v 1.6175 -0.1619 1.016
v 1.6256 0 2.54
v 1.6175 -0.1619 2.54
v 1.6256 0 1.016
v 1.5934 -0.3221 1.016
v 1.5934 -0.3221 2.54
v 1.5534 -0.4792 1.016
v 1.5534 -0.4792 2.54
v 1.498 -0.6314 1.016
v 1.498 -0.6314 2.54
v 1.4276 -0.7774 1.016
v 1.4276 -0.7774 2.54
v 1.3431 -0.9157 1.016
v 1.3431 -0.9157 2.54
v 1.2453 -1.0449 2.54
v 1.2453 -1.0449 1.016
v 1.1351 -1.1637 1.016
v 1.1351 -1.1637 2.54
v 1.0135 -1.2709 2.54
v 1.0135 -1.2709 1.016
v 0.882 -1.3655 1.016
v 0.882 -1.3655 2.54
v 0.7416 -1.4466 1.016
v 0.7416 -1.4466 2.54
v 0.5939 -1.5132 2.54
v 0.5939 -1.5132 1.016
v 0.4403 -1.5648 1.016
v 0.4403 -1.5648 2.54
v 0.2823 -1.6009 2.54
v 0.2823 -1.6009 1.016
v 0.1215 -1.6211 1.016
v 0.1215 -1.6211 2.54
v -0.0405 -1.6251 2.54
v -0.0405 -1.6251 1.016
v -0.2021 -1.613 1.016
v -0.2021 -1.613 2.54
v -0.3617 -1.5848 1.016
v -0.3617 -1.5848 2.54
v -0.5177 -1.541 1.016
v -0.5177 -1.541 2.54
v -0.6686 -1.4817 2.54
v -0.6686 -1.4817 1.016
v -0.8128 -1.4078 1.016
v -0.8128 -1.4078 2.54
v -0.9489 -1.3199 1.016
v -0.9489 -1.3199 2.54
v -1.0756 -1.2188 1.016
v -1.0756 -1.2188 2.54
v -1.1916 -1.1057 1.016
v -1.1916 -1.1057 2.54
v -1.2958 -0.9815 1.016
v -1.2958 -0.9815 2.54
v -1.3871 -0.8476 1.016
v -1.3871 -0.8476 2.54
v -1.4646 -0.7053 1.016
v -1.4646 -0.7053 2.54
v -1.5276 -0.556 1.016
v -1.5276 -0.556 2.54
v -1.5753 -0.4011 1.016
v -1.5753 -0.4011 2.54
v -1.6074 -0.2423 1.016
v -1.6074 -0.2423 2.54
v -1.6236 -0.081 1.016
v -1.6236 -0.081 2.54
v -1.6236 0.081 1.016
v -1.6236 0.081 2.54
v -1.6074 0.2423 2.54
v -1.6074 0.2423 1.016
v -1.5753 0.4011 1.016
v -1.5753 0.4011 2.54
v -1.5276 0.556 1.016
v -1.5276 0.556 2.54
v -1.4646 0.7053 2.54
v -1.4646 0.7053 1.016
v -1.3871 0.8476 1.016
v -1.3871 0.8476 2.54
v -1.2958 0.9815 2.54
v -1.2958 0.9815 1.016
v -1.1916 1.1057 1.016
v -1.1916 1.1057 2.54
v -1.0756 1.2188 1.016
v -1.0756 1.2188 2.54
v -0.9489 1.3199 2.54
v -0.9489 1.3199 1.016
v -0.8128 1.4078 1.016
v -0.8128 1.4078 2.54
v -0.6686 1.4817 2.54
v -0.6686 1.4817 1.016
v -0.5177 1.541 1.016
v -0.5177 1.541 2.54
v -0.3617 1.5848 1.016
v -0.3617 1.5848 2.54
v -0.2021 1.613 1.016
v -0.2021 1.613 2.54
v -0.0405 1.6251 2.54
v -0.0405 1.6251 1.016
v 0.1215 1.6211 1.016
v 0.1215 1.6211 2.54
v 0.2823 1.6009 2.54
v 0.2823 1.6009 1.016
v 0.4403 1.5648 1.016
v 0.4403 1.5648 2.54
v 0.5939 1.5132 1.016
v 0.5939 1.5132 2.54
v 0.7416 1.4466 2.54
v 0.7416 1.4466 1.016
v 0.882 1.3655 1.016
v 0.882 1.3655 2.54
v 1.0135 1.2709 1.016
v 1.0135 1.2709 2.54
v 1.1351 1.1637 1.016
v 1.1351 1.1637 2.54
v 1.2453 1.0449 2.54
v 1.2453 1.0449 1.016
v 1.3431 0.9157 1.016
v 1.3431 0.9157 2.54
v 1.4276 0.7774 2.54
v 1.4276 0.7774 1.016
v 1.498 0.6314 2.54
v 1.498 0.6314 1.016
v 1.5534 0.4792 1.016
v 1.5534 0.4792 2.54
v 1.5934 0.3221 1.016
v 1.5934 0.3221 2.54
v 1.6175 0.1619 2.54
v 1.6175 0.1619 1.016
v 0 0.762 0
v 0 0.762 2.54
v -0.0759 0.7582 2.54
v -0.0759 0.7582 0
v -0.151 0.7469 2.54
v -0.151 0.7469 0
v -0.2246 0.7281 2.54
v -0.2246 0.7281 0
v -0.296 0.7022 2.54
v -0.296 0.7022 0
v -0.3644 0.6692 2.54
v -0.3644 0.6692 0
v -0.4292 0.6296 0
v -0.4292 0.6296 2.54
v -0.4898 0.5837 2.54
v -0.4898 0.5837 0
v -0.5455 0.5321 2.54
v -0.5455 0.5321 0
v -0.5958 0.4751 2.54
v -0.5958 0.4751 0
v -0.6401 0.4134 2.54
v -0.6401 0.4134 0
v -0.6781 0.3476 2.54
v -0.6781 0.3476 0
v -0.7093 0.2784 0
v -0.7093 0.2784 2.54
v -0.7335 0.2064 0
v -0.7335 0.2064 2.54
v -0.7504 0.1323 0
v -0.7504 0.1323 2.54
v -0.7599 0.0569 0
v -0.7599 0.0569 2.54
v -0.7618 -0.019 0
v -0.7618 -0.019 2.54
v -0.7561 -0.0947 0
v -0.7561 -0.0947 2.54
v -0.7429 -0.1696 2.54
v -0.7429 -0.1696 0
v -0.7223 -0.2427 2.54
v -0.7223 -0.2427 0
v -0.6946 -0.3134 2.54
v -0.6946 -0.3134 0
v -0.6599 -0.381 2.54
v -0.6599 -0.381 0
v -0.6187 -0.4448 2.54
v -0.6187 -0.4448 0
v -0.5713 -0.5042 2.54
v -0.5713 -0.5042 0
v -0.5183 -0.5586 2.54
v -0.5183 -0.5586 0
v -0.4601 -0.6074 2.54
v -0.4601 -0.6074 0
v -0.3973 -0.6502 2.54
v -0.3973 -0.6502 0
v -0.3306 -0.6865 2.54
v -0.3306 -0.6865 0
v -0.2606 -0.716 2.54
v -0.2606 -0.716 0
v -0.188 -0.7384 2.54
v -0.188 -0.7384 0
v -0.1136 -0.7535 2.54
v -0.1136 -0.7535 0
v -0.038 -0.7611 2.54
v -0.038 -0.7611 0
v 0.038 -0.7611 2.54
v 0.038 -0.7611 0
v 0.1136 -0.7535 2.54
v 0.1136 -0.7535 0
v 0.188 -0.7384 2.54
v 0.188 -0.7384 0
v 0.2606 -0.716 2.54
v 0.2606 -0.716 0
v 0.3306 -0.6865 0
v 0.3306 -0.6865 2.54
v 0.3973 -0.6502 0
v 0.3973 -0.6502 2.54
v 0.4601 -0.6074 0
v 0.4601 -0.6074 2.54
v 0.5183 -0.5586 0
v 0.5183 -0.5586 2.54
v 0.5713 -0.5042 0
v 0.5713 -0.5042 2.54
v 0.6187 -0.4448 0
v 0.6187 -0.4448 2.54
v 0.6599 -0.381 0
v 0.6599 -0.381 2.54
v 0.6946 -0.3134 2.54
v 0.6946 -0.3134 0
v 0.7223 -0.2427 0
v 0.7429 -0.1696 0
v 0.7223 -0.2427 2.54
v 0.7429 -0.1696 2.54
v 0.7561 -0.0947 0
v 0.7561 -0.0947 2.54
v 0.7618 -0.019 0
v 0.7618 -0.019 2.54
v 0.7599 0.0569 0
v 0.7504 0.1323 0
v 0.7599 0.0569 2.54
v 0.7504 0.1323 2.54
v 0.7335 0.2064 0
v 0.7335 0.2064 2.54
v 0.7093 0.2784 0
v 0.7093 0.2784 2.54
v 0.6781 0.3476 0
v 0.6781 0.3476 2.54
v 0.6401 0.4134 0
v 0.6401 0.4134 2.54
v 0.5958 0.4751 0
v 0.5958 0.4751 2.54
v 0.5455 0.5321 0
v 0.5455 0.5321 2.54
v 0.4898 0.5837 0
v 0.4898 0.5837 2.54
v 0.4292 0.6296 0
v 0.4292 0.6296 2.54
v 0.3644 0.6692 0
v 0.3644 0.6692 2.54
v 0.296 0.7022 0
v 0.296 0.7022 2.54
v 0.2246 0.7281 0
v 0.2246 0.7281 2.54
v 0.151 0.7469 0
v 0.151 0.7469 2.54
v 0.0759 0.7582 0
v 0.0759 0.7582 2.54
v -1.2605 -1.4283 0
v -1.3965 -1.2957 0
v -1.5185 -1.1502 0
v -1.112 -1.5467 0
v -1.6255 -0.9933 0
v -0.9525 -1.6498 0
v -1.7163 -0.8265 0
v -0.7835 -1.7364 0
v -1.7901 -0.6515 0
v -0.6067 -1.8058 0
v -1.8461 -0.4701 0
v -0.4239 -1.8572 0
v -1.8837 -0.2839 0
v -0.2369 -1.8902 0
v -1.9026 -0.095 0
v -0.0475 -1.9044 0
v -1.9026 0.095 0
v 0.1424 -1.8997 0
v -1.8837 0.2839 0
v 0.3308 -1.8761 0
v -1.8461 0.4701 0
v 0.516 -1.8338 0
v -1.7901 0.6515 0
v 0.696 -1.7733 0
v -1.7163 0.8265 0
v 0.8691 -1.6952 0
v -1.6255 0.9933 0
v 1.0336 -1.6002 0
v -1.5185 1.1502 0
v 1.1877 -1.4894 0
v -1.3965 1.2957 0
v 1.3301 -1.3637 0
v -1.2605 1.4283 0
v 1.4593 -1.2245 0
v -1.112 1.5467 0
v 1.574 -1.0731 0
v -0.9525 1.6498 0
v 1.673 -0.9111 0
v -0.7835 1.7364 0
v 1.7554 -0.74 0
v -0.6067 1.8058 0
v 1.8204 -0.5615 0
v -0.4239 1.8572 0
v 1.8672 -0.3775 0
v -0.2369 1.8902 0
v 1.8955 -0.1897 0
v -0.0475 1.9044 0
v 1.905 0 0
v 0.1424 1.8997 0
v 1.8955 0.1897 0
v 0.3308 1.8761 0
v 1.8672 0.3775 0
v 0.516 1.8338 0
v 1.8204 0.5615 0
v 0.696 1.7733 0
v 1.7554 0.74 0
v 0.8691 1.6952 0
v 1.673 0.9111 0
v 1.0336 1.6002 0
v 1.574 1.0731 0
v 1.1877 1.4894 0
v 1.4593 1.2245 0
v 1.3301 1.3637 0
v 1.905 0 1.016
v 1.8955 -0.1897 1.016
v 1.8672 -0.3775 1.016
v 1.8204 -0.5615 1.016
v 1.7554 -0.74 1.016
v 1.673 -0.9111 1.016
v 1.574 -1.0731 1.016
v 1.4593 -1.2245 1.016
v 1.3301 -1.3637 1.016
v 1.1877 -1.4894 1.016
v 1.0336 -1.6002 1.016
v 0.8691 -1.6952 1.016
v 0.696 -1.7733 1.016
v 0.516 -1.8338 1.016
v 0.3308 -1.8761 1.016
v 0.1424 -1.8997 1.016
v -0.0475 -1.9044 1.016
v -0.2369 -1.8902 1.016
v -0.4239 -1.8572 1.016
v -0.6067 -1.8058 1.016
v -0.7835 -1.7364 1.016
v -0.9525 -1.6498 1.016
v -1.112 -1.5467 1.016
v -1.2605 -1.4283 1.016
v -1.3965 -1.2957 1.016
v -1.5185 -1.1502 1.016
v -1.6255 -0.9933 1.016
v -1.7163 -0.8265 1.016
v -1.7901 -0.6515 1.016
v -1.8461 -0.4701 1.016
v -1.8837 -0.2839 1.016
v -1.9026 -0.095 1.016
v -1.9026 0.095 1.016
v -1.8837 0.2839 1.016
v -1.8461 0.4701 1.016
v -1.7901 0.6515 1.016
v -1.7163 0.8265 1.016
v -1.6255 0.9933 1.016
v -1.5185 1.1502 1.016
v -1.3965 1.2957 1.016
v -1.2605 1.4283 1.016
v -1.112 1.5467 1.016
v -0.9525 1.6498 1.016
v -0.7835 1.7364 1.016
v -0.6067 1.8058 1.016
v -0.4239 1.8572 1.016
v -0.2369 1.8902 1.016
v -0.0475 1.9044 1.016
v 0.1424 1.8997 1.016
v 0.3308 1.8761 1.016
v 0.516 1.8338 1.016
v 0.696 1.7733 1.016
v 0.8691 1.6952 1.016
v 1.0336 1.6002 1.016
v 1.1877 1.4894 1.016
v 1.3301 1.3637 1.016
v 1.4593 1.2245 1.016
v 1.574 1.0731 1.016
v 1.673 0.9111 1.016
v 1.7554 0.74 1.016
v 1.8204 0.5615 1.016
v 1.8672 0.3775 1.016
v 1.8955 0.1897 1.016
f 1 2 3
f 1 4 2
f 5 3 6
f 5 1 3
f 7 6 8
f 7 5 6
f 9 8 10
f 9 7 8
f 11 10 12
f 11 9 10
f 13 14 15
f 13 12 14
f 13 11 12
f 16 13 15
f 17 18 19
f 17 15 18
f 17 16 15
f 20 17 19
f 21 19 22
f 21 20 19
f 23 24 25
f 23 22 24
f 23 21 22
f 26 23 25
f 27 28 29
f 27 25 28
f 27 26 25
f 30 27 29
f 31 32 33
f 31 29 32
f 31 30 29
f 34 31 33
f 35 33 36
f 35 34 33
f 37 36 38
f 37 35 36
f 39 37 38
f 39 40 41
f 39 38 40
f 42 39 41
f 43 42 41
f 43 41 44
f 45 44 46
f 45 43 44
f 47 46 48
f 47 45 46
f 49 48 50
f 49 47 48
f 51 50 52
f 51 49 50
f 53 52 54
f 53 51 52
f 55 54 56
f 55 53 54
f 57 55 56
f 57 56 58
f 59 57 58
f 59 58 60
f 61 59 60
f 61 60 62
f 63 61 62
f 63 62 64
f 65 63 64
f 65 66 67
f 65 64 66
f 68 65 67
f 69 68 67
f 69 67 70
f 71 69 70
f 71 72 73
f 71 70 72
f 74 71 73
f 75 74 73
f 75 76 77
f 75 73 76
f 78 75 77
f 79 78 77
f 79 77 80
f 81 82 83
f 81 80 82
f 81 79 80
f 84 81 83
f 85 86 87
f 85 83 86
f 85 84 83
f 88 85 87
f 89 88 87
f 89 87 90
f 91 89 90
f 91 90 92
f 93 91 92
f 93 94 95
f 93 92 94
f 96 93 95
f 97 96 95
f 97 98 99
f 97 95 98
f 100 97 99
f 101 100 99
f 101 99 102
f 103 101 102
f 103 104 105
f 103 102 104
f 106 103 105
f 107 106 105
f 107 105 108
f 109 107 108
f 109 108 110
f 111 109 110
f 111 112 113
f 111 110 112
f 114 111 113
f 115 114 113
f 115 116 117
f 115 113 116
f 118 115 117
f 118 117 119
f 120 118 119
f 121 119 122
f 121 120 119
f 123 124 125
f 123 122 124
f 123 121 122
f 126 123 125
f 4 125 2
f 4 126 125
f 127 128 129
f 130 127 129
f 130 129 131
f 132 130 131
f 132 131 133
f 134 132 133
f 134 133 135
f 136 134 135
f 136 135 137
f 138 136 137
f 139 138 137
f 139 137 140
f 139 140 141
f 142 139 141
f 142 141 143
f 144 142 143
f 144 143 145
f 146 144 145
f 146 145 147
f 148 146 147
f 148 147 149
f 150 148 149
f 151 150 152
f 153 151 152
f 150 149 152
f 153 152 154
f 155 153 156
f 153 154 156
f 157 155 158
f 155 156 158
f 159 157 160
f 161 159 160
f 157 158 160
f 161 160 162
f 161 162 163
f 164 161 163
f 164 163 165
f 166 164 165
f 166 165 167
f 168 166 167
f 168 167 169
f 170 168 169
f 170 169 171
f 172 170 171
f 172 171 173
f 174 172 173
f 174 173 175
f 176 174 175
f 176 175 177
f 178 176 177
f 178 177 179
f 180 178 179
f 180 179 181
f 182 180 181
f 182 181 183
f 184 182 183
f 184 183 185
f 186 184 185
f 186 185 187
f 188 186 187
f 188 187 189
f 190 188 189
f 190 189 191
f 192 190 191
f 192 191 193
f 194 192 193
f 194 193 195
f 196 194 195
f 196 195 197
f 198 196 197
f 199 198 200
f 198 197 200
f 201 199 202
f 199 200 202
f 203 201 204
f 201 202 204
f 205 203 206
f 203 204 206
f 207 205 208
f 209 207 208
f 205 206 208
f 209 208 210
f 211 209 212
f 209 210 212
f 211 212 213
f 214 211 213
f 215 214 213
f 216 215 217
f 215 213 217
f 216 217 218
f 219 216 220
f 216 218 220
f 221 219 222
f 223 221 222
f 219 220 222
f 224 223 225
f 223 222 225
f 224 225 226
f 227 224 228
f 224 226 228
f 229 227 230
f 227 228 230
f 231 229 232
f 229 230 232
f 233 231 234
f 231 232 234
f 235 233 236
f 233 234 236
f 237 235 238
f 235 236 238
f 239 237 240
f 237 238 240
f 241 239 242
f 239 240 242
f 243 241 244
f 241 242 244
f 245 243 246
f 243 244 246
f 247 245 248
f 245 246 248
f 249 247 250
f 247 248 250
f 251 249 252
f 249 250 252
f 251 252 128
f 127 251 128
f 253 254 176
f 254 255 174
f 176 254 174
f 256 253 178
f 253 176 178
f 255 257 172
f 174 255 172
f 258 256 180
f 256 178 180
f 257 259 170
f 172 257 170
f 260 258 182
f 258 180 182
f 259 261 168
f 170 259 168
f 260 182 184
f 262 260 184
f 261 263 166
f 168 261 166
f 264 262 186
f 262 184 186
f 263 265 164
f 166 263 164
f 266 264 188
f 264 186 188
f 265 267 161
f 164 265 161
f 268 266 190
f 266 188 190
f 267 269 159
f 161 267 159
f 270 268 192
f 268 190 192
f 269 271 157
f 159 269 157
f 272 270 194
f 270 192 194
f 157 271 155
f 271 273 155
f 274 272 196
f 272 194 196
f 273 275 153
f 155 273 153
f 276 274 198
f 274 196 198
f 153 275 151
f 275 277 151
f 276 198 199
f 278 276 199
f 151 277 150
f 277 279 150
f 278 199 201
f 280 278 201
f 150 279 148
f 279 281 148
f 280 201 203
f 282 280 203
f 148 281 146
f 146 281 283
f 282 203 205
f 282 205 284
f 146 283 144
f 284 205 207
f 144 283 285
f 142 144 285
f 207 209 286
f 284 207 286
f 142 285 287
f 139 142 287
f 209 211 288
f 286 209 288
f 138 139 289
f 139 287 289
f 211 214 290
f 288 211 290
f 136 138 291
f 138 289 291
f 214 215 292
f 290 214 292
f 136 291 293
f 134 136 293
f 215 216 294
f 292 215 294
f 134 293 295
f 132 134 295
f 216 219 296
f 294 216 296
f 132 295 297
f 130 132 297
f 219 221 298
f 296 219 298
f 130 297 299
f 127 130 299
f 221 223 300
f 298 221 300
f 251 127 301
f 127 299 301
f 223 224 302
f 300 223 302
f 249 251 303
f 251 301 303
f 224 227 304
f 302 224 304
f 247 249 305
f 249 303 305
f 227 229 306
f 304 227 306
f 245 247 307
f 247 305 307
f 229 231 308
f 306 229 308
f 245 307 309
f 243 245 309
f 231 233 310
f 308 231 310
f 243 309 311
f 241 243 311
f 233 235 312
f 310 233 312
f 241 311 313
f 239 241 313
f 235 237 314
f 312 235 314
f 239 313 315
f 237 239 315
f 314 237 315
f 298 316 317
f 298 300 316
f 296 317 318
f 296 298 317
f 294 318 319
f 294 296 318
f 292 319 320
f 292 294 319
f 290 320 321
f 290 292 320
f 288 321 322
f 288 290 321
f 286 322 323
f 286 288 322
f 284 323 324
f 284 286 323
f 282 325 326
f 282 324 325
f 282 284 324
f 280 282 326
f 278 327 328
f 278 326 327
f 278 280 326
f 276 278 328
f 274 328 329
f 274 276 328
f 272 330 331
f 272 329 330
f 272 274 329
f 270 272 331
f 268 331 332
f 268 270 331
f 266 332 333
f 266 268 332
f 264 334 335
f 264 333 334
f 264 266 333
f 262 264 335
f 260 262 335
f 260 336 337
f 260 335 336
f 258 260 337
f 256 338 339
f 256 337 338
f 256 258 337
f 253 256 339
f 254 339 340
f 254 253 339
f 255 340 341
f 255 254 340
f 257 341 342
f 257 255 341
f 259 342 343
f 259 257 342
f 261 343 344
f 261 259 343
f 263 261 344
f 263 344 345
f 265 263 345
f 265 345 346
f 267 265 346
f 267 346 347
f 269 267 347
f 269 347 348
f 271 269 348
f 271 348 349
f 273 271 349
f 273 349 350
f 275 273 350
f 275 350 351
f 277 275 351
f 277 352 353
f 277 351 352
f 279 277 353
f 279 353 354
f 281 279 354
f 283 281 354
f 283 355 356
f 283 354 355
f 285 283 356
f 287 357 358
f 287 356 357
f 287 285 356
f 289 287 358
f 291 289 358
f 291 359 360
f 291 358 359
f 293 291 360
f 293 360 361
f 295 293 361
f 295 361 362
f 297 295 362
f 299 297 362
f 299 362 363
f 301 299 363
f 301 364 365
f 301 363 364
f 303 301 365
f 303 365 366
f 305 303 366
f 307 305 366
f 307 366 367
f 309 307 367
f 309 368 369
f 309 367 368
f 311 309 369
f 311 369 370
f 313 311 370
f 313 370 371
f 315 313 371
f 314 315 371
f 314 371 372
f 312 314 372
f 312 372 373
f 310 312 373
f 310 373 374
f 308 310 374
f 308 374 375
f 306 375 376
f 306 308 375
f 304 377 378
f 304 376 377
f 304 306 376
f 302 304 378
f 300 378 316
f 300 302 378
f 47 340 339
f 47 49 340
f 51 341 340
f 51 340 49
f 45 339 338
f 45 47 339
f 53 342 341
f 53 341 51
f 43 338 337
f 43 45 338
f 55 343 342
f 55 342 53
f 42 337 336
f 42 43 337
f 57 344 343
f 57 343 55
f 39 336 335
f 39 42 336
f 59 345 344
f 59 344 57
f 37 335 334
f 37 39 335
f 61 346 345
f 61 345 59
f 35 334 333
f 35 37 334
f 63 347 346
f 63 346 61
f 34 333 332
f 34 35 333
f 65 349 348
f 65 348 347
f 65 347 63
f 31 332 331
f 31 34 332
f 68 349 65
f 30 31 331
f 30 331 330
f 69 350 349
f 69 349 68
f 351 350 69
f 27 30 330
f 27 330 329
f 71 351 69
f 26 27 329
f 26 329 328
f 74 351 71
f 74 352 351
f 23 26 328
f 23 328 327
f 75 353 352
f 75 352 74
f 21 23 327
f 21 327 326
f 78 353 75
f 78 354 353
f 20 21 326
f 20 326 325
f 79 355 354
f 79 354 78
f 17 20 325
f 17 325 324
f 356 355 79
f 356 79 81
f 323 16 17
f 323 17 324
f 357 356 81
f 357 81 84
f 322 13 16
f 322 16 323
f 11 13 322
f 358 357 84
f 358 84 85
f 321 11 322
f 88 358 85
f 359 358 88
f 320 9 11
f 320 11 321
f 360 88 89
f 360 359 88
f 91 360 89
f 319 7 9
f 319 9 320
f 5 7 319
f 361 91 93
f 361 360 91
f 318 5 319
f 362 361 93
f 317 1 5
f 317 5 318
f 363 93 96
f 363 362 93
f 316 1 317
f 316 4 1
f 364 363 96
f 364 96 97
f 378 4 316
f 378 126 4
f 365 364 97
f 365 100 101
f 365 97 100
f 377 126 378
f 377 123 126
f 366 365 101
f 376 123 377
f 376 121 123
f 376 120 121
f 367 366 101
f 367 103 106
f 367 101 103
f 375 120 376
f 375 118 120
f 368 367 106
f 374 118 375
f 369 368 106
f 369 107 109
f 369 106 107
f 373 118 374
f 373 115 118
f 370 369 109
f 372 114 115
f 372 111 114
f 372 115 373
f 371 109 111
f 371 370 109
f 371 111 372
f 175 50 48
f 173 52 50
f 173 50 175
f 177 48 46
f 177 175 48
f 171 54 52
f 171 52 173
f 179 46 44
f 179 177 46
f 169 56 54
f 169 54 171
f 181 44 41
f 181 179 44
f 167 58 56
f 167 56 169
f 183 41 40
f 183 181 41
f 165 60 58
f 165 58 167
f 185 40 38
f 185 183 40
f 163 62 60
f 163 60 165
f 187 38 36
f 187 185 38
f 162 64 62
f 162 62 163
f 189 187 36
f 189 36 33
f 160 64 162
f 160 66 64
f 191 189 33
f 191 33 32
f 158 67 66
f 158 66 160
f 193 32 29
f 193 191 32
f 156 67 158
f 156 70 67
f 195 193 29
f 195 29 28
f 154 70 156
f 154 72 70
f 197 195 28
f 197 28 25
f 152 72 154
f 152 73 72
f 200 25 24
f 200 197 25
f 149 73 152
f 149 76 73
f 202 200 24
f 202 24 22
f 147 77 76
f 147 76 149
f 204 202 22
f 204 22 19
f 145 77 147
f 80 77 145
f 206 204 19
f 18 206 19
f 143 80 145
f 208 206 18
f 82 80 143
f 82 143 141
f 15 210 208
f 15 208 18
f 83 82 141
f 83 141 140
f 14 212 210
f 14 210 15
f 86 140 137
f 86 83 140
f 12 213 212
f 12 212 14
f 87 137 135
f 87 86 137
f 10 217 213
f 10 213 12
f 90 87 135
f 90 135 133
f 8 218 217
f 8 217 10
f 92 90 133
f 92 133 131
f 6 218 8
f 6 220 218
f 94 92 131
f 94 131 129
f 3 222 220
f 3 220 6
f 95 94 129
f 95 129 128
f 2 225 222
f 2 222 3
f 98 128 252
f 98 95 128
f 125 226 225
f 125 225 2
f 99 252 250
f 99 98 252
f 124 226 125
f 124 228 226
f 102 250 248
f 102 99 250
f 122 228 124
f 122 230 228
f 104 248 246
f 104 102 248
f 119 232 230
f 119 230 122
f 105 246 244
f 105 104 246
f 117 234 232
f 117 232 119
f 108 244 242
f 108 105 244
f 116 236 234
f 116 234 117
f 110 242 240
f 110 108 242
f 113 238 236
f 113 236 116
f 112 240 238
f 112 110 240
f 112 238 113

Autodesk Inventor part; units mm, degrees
ref_plane "YZ Plane" through (0, 0, 0) normal (1, 0, 0) x (0, 1, 0)
ref_plane "XZ Plane" through (0, 0, 0) normal (0, 1, 0) x (-1, 0, 0)
ref_plane "XY Plane" through (0, 0, 0) normal (0, 0, 1) x (1, 0, 0)
sketch "Sketch1" plane through (0, 0, 0) normal (0, 0, 1) x (1, 0, 0)
  circle A0 centre (0, 0) radius 1.905
  dimension "d0" = 3.81
extrude "Extrusion1" add sketch "Sketch1" along normal blind 1.016
sketch "Sketch2" plane through (0, 0, 1.016) normal (0, 0, 1) x (1, 0, 0)
  circle A0 centre (0, 0) radius 1.905 projected
  circle A1 centre (0, 0) radius 1.6256
  dimension "d3" = 3.2512
extrude "Extrusion2" add sketch "Sketch2" along normal blind 1.524 contours A1
sketch "Sketch3" plane through (0, 0, 0) normal (0, 0, -1) x (-1, 0, 0)
  circle A0 centre (0, 0) radius 1.905 projected
hole "Hole1" at (0, 0, 0) direction (0, 0, 1) diameter 1.524 end through all
properties part number "upper_cap" material "Acetal Resin, White"
